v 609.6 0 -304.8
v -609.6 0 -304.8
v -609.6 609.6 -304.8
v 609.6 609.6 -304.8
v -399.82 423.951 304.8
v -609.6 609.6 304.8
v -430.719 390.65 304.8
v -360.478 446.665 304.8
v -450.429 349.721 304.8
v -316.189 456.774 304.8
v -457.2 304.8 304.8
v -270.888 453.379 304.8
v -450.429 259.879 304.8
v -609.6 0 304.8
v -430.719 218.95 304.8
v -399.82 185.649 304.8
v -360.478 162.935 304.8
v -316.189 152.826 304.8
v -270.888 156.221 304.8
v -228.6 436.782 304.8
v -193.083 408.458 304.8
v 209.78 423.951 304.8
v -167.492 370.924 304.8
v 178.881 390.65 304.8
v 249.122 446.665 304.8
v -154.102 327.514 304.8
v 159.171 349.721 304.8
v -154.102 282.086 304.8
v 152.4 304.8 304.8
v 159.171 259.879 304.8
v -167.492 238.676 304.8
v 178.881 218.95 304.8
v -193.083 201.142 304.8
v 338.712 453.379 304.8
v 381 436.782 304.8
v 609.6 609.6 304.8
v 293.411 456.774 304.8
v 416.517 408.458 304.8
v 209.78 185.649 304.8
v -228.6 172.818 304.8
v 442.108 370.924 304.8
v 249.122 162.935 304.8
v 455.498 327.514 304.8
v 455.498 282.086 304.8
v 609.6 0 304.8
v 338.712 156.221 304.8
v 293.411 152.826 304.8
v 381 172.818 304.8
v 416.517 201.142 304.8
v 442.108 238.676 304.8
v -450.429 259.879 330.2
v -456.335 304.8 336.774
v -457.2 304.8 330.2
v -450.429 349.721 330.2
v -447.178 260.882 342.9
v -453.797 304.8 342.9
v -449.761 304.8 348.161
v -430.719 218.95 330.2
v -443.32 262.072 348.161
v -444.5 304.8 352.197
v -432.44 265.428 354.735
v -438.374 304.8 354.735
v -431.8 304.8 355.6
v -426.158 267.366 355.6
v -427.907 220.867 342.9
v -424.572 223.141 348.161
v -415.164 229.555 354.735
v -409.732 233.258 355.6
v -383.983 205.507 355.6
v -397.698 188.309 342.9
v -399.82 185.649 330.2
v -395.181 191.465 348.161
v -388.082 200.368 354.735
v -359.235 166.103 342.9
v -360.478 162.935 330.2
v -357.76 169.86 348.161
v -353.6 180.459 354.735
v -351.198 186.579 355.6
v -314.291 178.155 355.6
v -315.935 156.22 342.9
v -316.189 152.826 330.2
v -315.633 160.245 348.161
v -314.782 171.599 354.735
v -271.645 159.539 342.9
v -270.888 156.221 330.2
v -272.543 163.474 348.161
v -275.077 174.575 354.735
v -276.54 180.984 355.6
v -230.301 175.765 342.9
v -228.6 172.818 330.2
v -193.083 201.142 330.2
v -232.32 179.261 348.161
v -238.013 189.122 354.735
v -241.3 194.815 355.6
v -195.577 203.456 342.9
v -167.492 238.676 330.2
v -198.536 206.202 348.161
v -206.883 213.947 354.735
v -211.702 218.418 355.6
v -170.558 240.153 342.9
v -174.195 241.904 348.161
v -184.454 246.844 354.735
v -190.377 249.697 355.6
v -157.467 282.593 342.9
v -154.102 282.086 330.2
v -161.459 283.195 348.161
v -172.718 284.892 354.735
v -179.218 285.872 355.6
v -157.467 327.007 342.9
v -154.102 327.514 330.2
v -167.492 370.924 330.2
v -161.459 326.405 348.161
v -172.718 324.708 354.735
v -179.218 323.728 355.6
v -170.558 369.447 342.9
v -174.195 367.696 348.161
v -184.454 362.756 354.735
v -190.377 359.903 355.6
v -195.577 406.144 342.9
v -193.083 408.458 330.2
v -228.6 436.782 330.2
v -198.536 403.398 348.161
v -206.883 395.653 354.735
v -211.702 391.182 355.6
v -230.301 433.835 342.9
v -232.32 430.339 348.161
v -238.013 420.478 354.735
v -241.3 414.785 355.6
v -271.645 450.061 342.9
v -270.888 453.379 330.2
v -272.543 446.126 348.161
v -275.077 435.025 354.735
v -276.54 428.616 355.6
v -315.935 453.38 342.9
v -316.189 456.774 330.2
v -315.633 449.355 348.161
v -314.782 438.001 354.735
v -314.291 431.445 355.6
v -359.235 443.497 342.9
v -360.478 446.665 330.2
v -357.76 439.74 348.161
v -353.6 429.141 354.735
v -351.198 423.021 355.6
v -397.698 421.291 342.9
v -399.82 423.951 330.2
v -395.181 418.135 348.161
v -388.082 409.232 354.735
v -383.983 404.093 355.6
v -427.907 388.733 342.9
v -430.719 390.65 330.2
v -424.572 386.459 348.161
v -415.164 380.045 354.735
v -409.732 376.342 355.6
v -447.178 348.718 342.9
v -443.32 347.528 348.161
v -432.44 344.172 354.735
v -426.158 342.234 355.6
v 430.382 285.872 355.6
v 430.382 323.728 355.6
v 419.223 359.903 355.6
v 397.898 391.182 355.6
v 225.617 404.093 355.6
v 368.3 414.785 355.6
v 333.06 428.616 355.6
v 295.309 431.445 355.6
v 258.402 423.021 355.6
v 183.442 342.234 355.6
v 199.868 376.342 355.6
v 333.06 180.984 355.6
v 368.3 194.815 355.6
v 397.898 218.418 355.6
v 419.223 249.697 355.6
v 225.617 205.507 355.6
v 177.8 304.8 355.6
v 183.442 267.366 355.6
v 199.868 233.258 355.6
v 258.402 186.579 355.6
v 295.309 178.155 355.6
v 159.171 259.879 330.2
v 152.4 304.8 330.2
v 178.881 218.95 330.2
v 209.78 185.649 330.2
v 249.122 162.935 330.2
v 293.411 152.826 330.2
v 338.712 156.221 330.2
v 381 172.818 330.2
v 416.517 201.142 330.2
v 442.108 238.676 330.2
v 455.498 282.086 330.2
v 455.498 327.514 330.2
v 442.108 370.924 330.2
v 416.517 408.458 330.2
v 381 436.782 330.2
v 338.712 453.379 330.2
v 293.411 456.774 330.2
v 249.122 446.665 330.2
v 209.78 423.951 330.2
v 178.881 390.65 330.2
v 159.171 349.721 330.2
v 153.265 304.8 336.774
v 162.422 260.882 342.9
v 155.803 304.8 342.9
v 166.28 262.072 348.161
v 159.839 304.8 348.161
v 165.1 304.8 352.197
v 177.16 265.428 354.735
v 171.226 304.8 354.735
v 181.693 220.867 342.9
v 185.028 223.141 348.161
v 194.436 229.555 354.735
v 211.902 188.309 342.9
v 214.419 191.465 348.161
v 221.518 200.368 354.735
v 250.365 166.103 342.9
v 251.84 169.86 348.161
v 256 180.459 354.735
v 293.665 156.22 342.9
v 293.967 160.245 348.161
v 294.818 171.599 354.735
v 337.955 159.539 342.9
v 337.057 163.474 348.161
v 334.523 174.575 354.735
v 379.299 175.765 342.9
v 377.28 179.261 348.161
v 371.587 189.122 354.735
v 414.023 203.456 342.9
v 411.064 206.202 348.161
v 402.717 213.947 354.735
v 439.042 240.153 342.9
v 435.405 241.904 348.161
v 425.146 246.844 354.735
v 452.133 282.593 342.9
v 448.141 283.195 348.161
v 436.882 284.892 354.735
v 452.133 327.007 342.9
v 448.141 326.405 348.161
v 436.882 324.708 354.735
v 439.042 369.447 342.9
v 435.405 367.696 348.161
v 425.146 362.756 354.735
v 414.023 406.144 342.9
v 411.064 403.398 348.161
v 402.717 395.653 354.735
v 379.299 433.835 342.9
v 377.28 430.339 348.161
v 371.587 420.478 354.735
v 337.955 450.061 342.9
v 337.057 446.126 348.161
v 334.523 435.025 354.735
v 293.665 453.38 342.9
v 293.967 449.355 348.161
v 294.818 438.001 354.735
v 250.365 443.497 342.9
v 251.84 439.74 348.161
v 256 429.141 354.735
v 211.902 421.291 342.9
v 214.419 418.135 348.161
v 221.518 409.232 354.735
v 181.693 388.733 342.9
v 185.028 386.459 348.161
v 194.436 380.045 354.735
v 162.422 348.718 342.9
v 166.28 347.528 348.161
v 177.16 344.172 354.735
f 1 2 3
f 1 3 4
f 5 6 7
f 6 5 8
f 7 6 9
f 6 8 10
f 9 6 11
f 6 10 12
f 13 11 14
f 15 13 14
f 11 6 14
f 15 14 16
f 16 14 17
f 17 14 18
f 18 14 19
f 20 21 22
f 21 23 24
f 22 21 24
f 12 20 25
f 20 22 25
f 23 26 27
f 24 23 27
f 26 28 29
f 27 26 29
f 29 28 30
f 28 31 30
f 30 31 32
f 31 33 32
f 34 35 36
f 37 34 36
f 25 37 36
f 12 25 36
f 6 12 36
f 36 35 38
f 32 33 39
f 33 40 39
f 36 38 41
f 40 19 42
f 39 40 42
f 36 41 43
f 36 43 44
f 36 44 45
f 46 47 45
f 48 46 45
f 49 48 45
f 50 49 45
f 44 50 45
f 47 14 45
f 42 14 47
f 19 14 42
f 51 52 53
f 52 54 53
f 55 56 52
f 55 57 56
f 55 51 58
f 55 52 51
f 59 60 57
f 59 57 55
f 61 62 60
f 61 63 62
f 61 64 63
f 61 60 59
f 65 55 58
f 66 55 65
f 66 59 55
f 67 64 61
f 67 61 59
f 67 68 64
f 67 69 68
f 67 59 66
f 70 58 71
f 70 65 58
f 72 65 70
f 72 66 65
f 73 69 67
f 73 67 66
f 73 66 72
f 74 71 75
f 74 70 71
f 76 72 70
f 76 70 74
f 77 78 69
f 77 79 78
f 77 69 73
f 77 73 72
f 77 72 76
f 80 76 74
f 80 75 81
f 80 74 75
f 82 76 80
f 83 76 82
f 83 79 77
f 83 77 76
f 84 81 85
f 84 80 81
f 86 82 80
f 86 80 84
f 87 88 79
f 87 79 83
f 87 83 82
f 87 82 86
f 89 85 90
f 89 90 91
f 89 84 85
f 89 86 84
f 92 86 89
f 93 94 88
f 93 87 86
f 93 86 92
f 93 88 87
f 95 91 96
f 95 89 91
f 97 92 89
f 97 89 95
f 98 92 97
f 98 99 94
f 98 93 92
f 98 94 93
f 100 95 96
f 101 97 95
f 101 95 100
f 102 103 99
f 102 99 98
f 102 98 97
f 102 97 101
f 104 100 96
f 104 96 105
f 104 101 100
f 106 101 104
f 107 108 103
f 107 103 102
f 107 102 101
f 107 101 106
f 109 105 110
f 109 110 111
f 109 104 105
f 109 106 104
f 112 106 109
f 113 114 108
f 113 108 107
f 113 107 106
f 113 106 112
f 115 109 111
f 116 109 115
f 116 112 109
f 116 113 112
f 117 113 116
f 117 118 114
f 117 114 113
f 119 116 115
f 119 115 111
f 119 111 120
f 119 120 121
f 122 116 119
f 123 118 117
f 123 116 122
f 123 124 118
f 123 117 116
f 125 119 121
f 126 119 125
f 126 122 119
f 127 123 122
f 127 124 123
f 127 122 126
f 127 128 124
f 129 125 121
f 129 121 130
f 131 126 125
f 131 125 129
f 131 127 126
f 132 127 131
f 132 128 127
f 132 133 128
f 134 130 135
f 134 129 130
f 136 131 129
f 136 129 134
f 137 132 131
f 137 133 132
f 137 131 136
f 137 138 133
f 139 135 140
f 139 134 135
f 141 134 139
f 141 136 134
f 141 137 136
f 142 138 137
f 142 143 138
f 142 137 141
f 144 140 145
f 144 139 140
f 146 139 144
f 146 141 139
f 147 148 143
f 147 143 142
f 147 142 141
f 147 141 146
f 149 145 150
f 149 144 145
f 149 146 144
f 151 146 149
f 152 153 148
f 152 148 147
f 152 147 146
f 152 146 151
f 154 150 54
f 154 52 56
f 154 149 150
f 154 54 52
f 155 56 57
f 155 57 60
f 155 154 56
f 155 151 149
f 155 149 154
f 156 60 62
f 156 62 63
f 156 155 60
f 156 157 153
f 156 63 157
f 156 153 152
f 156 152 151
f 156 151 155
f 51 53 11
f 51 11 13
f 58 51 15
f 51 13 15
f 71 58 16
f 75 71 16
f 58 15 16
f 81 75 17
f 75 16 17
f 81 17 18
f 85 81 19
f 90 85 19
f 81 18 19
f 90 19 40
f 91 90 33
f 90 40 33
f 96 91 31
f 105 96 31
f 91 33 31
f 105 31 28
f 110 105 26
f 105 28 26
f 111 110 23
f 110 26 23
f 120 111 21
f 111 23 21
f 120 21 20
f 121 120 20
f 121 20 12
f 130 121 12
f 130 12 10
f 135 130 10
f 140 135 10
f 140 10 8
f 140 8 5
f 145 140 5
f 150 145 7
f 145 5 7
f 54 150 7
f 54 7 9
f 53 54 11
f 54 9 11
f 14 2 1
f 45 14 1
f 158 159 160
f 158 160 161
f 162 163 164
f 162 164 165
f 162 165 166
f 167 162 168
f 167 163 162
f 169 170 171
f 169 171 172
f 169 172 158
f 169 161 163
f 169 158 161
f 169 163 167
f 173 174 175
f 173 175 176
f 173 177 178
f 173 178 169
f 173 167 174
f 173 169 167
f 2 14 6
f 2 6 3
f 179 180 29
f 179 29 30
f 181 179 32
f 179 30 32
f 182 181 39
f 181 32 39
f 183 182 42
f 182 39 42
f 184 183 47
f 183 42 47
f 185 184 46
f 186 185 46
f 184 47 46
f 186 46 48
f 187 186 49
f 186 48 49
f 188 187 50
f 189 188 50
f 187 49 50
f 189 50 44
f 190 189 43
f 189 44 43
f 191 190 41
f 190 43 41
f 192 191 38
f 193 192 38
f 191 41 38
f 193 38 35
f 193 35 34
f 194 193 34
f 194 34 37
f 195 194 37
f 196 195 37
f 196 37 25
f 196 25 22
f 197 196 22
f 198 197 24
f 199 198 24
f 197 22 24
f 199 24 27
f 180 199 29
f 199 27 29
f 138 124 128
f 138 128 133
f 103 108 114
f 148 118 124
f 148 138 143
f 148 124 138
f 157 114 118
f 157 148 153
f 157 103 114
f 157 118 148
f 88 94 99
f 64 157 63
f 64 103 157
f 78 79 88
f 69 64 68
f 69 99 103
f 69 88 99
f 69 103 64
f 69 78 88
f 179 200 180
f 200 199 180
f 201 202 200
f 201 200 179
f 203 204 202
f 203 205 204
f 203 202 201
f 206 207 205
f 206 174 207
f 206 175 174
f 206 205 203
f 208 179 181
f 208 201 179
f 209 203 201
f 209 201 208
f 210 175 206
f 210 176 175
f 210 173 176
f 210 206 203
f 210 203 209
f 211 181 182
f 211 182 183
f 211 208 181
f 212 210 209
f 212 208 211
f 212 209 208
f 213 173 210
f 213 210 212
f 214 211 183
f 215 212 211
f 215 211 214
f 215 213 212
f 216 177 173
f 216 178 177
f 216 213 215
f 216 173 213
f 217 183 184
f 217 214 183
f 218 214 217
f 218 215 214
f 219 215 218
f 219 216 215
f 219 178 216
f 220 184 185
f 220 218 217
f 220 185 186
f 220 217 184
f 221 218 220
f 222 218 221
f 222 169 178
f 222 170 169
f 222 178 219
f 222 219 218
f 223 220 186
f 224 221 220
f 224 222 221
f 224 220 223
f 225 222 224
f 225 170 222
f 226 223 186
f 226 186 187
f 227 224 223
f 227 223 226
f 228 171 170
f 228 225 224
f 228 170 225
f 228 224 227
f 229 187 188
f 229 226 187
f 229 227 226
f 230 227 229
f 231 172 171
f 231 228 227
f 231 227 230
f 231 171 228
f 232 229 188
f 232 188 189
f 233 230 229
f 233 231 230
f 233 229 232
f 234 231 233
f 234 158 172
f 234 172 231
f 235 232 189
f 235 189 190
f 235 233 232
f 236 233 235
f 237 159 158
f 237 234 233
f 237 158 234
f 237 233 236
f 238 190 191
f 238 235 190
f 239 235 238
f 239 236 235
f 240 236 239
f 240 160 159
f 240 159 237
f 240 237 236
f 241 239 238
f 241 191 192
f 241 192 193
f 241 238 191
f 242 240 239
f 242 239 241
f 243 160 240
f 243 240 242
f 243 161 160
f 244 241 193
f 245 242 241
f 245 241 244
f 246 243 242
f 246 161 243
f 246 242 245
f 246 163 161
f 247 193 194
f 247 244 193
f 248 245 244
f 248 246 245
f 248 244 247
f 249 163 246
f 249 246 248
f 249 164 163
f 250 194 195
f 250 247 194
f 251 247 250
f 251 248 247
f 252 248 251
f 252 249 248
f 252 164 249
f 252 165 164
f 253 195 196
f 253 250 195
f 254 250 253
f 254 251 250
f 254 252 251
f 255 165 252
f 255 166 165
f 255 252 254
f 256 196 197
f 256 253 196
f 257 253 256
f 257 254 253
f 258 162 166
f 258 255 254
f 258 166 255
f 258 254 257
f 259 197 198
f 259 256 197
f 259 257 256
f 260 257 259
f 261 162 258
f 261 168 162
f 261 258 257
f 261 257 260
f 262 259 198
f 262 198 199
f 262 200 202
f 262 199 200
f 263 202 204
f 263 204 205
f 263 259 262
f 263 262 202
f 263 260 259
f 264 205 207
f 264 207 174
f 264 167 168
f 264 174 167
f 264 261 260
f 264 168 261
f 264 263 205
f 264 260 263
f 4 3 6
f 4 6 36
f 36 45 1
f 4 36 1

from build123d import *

# Parameters (mm, degrees)
SKETCH1_W           = 1219.2
SKETCH1_H           = 609.6
BOSS_EXTRUDE1_DEPTH = 609.6
SKETCH2_R           = 152.4
BOSS_EXTRUDE2_DEPTH = 50.8
FILLET1_R           = 25.4


with BuildPart() as part:
    # Sketch1 → Boss-Extrude1 (new body)
    with BuildSketch(Plane(origin=(0, 0, 0), x_dir=(1, 0, 0), z_dir=(0, 1, 0))):
        Rectangle(SKETCH1_W, SKETCH1_H)
    extrude(amount=BOSS_EXTRUDE1_DEPTH)

    # Sketch2 → Boss-Extrude2 (add)
    with BuildSketch(Plane.XY.offset(304.8)):
        with Locations(Location((-304.8, 304.8, 0), (0, 0, 180))):
            Circle(SKETCH2_R)
        with Locations(Location((304.8, 304.8, 0), (0, 0, 180))):
            Circle(SKETCH2_R)
    extrude(amount=BOSS_EXTRUDE2_DEPTH)

    # Fillet1
    fillet1_edges = [part.edges().sort_by_distance(p)[0] for p in [
        (-152.4, 304.8, 355.6),
        (457.2, 304.8, 355.6),
    ]]
    fillet(fillet1_edges, radius=FILLET1_R)


solid = part.part
